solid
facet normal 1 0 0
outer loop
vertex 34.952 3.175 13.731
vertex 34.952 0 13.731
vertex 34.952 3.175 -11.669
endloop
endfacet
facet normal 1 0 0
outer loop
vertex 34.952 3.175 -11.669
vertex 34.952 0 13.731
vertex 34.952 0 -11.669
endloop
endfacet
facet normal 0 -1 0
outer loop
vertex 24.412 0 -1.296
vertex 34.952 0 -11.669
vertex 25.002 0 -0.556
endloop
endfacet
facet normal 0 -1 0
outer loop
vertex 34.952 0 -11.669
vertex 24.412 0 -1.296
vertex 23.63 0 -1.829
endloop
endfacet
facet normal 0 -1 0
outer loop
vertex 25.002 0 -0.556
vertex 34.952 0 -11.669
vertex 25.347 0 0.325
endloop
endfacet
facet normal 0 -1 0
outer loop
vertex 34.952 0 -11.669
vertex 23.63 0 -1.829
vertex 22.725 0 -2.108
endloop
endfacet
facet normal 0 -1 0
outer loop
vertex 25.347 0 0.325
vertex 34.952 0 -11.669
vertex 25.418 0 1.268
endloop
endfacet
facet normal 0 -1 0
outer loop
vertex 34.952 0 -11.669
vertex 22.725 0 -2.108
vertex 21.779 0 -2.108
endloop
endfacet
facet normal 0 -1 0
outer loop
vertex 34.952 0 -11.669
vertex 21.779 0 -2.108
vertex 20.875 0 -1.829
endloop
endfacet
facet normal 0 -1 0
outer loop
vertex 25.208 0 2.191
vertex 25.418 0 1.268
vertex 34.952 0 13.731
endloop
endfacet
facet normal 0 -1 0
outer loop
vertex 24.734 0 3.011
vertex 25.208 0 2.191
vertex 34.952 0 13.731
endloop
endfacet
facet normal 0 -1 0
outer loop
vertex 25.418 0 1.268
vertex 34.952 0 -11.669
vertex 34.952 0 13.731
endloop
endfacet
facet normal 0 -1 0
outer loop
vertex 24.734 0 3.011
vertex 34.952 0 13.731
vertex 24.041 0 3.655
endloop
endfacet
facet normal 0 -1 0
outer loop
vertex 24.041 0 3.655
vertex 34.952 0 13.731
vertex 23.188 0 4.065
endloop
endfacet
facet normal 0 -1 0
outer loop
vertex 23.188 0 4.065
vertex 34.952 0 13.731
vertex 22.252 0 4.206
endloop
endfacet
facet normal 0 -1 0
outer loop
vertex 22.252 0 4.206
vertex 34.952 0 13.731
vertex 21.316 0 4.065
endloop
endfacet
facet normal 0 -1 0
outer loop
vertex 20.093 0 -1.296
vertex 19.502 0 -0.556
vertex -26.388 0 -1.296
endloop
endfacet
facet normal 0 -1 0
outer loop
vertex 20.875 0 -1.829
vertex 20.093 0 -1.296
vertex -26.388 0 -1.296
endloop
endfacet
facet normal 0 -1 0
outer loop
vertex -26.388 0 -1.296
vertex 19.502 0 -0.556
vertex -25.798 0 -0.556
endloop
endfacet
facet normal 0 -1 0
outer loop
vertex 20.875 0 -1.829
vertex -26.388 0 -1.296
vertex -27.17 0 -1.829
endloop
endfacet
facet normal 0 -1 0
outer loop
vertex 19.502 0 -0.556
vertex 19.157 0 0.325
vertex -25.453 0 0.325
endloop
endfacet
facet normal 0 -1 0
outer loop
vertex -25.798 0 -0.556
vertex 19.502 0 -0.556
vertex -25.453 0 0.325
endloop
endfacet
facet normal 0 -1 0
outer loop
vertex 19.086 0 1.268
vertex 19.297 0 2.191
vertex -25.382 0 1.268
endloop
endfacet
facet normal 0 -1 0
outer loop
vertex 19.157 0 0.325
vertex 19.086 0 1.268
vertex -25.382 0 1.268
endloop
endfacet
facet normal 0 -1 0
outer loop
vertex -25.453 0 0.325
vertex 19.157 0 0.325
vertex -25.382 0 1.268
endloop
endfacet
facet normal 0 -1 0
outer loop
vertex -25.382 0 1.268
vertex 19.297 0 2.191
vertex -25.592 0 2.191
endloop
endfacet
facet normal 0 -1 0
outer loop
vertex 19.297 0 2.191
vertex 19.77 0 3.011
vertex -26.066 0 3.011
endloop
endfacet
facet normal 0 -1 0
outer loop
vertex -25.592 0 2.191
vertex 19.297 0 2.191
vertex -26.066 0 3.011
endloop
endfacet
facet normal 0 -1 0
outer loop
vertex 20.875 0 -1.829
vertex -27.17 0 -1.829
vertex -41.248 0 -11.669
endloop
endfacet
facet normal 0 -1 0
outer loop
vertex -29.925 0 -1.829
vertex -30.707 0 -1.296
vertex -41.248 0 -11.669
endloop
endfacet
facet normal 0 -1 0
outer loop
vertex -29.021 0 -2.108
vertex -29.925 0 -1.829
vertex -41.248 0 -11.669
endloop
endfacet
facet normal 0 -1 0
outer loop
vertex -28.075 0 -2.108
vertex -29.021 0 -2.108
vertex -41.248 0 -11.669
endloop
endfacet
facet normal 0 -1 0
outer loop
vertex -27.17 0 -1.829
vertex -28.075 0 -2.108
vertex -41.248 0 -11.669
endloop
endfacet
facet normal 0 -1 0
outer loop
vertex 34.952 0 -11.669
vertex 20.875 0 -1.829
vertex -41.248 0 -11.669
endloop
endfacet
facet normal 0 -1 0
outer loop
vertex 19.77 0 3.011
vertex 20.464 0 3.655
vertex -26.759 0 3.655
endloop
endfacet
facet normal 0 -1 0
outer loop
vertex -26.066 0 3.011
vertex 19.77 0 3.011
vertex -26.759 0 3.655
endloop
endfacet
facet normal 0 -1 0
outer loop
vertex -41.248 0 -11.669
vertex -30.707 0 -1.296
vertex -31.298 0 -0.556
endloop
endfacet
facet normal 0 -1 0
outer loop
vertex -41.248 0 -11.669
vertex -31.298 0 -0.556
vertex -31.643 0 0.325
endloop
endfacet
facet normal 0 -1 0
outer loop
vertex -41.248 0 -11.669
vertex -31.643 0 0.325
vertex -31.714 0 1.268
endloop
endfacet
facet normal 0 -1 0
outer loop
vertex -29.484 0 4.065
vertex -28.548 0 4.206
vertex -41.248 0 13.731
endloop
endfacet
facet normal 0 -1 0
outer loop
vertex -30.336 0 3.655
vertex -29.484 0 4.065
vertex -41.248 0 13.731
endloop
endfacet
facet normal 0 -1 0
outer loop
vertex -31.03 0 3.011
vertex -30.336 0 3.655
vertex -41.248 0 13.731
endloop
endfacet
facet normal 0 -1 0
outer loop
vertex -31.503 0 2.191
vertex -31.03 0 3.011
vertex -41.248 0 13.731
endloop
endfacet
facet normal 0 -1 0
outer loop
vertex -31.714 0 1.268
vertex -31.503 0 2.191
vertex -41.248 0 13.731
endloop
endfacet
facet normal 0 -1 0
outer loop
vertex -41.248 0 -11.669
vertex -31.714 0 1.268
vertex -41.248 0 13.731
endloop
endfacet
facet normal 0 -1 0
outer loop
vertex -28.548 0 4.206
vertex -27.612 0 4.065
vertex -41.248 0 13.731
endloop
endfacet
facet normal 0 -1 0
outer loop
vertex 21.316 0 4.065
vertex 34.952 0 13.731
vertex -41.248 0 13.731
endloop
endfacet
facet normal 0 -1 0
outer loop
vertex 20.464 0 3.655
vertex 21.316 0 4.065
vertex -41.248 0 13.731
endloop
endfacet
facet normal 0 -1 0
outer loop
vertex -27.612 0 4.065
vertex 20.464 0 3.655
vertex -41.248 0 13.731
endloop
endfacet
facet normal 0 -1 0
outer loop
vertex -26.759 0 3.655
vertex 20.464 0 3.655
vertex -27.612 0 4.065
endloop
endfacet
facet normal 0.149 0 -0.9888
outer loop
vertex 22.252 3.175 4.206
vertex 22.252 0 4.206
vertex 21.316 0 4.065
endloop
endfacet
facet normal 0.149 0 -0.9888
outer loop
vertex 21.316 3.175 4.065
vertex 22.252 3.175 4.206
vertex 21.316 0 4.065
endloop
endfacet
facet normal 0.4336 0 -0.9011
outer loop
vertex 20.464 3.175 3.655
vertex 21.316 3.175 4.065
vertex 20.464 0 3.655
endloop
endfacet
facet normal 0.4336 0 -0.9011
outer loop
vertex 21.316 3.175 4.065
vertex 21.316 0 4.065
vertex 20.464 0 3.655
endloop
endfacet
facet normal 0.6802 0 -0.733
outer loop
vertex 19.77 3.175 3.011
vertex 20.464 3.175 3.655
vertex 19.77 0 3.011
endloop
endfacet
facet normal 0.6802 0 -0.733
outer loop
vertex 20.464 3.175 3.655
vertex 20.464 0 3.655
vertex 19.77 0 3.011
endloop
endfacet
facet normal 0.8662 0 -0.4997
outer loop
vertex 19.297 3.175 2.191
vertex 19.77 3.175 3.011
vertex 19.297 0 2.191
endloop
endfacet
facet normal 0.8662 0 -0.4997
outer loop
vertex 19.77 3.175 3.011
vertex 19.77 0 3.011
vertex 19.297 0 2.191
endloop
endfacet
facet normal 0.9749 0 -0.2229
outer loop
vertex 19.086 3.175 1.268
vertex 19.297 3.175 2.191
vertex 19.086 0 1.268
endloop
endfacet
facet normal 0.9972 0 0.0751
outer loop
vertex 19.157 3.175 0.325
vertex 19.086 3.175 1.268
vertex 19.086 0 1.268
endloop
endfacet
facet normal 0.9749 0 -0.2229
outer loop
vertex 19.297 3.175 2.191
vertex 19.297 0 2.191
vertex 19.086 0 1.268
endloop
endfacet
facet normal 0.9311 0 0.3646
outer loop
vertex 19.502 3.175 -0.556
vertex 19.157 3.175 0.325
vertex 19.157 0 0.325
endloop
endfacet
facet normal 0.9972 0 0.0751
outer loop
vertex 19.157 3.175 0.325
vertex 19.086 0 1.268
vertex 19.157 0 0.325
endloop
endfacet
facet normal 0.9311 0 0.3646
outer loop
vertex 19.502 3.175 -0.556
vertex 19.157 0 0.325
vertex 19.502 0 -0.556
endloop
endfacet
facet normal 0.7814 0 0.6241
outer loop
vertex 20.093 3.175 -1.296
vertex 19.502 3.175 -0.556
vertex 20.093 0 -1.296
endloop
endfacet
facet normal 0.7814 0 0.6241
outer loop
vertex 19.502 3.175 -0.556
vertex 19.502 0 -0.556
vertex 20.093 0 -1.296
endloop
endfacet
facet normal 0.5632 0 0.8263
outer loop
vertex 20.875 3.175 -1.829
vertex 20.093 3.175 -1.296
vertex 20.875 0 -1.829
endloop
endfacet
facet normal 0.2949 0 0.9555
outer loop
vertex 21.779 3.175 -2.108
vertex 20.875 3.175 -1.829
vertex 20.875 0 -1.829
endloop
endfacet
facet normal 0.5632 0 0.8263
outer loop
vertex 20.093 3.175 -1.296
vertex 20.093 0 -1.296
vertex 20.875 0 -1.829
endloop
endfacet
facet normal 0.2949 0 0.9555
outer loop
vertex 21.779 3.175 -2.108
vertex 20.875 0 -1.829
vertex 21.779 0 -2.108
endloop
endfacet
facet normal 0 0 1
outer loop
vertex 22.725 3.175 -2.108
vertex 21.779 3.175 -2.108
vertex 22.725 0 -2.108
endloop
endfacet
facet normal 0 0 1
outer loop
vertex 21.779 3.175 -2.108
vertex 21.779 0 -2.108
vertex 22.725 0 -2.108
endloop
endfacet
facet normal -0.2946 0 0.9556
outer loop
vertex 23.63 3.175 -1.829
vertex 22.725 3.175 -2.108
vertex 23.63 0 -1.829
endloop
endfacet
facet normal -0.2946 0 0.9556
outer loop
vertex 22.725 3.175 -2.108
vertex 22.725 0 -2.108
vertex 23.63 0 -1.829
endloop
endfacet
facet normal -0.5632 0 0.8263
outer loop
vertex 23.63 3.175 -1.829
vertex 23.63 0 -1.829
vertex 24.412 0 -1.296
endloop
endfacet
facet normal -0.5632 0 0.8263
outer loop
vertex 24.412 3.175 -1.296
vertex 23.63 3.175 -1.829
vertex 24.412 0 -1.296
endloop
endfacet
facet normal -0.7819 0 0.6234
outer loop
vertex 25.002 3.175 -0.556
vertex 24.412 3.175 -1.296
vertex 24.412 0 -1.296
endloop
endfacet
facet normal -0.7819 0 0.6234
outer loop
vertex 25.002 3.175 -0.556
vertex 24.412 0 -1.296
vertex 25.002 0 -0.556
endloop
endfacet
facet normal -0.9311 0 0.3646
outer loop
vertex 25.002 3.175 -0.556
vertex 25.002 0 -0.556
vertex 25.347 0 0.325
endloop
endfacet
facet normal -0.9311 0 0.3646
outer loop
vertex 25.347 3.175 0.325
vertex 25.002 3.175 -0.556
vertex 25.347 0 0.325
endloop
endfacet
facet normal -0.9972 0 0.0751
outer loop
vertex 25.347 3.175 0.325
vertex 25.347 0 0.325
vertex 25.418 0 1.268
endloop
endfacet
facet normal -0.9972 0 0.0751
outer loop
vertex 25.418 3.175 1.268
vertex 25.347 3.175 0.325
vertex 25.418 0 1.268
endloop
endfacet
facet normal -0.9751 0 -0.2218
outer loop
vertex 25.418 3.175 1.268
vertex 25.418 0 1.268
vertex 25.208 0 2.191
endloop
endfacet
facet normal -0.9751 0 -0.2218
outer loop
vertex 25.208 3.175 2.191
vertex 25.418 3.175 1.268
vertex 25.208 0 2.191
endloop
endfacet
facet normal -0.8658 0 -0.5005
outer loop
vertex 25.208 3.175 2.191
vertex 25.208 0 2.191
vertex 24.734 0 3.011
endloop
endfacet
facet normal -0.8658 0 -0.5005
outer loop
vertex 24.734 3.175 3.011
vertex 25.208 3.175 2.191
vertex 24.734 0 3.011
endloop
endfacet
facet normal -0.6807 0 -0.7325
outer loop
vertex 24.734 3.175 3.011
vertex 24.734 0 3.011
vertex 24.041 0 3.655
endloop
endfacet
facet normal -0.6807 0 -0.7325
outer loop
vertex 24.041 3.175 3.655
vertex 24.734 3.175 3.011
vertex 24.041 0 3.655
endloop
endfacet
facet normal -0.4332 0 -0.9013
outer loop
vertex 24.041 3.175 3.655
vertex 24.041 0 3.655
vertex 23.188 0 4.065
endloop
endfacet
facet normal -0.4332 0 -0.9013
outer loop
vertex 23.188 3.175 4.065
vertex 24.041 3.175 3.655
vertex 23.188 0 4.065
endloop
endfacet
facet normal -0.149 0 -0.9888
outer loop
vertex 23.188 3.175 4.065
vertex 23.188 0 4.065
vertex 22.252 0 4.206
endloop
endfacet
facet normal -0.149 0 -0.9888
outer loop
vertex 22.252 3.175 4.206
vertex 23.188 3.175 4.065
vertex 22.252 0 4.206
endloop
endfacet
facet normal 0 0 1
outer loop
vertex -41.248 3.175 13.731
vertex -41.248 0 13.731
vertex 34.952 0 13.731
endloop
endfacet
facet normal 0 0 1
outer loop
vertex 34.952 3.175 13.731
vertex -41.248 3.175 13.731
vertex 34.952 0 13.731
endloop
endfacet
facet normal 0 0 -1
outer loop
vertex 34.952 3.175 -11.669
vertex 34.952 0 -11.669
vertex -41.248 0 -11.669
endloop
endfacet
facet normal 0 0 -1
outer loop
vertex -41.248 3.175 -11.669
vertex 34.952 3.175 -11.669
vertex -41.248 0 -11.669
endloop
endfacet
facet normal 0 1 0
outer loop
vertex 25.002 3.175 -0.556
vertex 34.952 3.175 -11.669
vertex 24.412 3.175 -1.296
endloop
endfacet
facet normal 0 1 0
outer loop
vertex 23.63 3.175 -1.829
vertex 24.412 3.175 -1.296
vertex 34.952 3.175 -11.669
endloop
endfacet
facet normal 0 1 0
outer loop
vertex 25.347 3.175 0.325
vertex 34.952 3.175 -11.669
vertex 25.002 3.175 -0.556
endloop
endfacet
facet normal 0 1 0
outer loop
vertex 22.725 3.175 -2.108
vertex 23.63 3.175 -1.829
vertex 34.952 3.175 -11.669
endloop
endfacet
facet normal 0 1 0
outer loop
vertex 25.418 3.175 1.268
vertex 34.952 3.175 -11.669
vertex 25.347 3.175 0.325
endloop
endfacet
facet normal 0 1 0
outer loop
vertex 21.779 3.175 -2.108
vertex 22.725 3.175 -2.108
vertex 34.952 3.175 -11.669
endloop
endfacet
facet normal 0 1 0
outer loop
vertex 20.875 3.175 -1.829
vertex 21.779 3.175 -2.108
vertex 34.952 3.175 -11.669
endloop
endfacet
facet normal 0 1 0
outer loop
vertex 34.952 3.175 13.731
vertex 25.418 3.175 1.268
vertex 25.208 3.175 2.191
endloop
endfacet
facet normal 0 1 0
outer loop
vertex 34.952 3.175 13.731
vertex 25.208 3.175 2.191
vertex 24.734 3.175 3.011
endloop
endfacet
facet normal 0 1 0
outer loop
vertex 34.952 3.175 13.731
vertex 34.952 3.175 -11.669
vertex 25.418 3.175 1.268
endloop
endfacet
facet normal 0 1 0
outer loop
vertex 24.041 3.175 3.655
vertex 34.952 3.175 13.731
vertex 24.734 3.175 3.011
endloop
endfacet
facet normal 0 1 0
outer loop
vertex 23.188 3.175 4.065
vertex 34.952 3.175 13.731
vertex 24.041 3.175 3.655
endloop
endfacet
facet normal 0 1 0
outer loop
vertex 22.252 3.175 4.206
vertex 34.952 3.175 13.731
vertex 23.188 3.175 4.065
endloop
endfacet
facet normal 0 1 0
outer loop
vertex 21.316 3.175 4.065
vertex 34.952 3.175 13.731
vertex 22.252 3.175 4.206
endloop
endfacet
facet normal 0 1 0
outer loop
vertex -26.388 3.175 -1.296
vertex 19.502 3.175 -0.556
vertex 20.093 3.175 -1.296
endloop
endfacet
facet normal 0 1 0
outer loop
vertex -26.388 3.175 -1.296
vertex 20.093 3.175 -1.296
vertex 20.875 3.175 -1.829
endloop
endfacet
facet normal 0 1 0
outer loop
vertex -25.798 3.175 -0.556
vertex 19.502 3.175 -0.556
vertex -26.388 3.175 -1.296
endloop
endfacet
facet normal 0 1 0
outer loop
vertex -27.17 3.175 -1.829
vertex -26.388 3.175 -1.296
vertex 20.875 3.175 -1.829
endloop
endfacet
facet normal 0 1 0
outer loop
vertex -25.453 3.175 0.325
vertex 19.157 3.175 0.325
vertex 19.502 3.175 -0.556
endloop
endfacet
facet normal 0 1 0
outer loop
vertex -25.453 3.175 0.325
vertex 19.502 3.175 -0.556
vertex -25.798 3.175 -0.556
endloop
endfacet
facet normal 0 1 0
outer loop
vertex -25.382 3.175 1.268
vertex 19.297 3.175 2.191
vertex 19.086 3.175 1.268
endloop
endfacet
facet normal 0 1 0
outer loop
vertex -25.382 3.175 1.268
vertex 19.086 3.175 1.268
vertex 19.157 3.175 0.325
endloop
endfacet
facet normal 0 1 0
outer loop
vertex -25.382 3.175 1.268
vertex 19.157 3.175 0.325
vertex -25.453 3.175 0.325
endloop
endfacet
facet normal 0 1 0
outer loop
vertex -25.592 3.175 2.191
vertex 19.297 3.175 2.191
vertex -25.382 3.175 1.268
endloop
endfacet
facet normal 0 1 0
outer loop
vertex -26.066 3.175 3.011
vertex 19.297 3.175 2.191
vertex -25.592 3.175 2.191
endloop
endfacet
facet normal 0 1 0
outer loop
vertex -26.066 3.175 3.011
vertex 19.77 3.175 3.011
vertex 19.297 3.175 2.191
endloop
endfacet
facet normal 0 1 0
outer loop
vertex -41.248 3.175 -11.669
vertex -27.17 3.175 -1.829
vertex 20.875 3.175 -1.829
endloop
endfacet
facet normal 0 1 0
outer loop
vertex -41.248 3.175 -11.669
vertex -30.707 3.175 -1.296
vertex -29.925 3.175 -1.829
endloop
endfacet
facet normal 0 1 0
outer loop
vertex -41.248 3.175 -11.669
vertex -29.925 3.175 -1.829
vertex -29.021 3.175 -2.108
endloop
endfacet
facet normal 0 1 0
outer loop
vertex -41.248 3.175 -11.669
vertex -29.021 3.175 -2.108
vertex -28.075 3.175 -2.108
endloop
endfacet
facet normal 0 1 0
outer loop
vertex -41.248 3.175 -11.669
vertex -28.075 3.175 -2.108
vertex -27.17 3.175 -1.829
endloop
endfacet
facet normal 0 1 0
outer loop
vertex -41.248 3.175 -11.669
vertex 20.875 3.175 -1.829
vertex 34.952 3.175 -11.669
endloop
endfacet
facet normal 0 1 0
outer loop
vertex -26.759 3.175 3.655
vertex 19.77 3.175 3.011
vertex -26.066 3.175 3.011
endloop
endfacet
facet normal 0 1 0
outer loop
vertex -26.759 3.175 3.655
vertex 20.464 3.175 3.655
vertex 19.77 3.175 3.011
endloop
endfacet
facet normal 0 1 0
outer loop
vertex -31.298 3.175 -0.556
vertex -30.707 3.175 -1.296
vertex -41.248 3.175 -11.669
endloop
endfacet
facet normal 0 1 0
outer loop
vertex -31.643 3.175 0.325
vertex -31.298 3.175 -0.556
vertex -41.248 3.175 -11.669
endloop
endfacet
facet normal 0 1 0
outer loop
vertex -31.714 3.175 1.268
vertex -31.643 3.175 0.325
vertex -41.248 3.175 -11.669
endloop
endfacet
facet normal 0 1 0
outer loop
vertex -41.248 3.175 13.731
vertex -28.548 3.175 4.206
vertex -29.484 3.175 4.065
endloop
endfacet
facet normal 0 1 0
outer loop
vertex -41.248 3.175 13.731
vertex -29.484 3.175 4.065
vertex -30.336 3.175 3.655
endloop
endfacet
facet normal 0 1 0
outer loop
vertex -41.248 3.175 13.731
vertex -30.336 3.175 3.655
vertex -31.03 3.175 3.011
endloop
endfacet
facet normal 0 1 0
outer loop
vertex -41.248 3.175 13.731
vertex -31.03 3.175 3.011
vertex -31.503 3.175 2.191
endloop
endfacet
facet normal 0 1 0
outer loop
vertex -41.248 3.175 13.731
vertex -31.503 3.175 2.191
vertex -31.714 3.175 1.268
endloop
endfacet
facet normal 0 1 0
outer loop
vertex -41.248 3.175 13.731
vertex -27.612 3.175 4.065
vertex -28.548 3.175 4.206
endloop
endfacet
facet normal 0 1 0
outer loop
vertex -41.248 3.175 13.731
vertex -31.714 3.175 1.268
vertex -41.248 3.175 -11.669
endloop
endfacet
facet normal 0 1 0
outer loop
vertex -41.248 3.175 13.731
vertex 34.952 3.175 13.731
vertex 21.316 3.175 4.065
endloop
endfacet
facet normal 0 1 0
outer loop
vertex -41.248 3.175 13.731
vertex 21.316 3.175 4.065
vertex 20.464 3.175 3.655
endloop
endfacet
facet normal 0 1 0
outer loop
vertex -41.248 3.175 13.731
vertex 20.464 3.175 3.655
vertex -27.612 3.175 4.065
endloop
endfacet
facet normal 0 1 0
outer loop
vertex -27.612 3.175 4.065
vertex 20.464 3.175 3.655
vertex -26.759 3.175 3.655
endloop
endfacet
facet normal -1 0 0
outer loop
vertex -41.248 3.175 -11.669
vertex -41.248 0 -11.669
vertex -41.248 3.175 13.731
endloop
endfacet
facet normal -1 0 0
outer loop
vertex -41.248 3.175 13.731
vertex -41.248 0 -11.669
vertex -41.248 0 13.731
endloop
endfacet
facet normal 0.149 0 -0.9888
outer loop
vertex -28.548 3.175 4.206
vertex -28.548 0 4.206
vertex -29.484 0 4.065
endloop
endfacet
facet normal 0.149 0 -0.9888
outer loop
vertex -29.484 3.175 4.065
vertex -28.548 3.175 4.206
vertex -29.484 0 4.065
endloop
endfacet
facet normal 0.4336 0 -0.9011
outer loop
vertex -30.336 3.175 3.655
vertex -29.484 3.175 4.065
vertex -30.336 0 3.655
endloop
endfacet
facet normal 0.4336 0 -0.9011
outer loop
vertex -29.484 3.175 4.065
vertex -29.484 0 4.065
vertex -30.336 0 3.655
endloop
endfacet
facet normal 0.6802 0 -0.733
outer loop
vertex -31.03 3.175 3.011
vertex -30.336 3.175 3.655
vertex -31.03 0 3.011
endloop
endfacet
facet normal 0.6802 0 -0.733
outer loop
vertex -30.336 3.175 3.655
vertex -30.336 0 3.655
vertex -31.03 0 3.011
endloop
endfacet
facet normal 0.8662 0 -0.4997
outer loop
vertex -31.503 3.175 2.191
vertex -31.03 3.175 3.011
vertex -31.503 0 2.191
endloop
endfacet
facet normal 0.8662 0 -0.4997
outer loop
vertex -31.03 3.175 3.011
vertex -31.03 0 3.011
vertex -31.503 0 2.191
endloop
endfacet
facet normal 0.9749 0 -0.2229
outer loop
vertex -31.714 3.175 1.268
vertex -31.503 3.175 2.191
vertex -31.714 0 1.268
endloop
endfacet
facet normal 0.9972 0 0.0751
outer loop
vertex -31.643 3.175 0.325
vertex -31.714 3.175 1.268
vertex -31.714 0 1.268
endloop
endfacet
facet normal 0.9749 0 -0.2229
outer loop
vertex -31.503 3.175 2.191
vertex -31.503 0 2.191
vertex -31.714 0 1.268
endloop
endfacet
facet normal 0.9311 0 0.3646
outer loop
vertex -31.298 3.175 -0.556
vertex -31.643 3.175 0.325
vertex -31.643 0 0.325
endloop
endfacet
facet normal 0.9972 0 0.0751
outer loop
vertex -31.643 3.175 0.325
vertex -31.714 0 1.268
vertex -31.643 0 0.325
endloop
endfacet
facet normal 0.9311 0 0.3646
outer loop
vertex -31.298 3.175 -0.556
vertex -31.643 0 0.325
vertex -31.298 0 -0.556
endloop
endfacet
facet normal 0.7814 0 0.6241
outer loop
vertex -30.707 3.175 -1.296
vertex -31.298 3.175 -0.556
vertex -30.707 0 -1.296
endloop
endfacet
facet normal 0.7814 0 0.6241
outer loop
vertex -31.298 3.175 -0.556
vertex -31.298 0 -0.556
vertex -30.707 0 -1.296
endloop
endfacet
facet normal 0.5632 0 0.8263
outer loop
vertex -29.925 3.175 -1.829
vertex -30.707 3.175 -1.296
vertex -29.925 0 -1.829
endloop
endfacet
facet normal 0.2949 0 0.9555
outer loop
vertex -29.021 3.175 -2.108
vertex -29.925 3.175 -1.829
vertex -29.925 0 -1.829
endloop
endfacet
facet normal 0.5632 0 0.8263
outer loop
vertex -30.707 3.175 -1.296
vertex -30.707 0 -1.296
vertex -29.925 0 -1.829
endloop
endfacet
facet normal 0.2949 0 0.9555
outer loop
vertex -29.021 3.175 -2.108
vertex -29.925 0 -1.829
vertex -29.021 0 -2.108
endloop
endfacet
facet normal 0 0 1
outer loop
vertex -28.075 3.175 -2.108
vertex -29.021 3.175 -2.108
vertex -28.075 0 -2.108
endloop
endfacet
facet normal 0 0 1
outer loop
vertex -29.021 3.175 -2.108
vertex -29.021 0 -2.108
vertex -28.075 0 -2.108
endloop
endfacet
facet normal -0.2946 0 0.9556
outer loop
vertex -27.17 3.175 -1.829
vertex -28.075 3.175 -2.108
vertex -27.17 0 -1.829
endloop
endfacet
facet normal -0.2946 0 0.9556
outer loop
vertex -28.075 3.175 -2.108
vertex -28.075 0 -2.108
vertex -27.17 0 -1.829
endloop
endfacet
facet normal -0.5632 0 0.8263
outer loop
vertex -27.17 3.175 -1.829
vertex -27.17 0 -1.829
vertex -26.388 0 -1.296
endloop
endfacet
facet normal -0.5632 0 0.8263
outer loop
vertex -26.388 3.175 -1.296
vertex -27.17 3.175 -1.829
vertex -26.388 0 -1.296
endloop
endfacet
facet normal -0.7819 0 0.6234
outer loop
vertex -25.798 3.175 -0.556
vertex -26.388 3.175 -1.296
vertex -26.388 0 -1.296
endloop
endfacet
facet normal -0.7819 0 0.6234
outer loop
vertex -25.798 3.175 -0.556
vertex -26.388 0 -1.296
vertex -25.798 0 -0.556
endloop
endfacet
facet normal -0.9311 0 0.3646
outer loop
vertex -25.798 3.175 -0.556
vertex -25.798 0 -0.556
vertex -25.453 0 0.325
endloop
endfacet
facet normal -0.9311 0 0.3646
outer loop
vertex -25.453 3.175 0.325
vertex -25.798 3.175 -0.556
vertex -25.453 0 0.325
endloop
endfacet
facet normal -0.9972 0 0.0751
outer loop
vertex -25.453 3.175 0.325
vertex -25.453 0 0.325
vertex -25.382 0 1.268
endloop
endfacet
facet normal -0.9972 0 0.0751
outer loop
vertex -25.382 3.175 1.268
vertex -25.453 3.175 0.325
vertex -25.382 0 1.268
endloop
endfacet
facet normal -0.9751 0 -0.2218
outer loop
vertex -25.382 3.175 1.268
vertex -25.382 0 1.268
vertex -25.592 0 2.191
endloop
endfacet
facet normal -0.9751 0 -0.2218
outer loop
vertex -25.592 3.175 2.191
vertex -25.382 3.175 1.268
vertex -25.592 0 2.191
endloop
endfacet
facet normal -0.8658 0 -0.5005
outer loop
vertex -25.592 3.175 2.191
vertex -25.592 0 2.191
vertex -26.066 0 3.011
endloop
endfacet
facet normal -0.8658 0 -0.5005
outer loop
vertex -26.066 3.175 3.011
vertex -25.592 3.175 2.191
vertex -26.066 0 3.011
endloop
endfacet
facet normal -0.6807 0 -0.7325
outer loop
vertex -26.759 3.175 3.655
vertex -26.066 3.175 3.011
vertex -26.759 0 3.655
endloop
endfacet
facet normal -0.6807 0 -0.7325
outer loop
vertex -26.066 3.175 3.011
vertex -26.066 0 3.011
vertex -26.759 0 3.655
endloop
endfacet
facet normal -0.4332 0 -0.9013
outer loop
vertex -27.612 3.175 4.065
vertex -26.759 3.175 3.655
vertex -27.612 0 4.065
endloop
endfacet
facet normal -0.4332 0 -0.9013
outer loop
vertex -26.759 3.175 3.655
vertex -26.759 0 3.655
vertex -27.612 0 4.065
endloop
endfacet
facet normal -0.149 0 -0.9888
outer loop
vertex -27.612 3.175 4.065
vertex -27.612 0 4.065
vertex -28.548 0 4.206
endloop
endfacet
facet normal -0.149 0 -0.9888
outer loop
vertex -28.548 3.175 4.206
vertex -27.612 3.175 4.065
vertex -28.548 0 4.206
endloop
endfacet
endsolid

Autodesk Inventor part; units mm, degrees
ref_plane "YZ Plane" through (0, 0, 0) normal (1, 0, 0) x (0, 1, 0)
ref_plane "XZ Plane" through (0, 0, 0) normal (0, 1, 0) x (-1, 0, 0)
ref_plane "XY Plane" through (0, 0, 0) normal (0, 0, 1) x (1, 0, 0)
sketch "Sketch1" plane through (0, 0, 0) normal (0, 1, 0) x (-1, 0, 0)
  line L0 (-34.9521, -11.6688) -> (41.2479, -11.6688)
  line L1 (41.2479, -11.6688) -> (41.2479, 13.7312)
  line L2 (41.2479, 13.7312) -> (-34.9521, 13.7312)
  line L3 (-34.9521, 13.7312) -> (-34.9521, -11.6688)
  line L4 (-34.9521, -11.6688) -> (41.2479, 13.7312) construction
  line L5 (41.2479, -11.6688) -> (-34.9521, 13.7312) construction
  point P0 (0, 0)
  point P1 (3.1479, 1.0312)
  dimension "d0" = 76.2
  dimension "d2" = 25.4
extrude "Extrusion1" add sketch "Sketch1" along normal blind 3.175
sketch "Sketch2" plane through (0, 3.175, 0) normal (0, 1, 0) x (1, 0, 0)
  line L0 (34.9521, 11.6688) -> (-41.2479, 11.6688) projected
  line L1 (-41.2479, 11.6688) -> (-41.2479, -13.7312) projected
  line L2 (34.9521, -13.7312) -> (34.9521, 11.6688) projected
  point P0 (0, 0)
  point P1 (-28.5479, -1.0312)
  point P2 (22.2521, -1.0312)
  dimension "d5" = 12.7
  dimension "d6" = 12.7
  dimension "d7" = 12.7
  dimension "d8" = 12.7
hole "Hole1" at (-28.5479, 3.175, 1.0312) at (22.2521, 3.175, 1.0312) direction (0, -1, 0) diameter 6.35 end through all
properties part number "Spacer" material "Aluminum 6061"
